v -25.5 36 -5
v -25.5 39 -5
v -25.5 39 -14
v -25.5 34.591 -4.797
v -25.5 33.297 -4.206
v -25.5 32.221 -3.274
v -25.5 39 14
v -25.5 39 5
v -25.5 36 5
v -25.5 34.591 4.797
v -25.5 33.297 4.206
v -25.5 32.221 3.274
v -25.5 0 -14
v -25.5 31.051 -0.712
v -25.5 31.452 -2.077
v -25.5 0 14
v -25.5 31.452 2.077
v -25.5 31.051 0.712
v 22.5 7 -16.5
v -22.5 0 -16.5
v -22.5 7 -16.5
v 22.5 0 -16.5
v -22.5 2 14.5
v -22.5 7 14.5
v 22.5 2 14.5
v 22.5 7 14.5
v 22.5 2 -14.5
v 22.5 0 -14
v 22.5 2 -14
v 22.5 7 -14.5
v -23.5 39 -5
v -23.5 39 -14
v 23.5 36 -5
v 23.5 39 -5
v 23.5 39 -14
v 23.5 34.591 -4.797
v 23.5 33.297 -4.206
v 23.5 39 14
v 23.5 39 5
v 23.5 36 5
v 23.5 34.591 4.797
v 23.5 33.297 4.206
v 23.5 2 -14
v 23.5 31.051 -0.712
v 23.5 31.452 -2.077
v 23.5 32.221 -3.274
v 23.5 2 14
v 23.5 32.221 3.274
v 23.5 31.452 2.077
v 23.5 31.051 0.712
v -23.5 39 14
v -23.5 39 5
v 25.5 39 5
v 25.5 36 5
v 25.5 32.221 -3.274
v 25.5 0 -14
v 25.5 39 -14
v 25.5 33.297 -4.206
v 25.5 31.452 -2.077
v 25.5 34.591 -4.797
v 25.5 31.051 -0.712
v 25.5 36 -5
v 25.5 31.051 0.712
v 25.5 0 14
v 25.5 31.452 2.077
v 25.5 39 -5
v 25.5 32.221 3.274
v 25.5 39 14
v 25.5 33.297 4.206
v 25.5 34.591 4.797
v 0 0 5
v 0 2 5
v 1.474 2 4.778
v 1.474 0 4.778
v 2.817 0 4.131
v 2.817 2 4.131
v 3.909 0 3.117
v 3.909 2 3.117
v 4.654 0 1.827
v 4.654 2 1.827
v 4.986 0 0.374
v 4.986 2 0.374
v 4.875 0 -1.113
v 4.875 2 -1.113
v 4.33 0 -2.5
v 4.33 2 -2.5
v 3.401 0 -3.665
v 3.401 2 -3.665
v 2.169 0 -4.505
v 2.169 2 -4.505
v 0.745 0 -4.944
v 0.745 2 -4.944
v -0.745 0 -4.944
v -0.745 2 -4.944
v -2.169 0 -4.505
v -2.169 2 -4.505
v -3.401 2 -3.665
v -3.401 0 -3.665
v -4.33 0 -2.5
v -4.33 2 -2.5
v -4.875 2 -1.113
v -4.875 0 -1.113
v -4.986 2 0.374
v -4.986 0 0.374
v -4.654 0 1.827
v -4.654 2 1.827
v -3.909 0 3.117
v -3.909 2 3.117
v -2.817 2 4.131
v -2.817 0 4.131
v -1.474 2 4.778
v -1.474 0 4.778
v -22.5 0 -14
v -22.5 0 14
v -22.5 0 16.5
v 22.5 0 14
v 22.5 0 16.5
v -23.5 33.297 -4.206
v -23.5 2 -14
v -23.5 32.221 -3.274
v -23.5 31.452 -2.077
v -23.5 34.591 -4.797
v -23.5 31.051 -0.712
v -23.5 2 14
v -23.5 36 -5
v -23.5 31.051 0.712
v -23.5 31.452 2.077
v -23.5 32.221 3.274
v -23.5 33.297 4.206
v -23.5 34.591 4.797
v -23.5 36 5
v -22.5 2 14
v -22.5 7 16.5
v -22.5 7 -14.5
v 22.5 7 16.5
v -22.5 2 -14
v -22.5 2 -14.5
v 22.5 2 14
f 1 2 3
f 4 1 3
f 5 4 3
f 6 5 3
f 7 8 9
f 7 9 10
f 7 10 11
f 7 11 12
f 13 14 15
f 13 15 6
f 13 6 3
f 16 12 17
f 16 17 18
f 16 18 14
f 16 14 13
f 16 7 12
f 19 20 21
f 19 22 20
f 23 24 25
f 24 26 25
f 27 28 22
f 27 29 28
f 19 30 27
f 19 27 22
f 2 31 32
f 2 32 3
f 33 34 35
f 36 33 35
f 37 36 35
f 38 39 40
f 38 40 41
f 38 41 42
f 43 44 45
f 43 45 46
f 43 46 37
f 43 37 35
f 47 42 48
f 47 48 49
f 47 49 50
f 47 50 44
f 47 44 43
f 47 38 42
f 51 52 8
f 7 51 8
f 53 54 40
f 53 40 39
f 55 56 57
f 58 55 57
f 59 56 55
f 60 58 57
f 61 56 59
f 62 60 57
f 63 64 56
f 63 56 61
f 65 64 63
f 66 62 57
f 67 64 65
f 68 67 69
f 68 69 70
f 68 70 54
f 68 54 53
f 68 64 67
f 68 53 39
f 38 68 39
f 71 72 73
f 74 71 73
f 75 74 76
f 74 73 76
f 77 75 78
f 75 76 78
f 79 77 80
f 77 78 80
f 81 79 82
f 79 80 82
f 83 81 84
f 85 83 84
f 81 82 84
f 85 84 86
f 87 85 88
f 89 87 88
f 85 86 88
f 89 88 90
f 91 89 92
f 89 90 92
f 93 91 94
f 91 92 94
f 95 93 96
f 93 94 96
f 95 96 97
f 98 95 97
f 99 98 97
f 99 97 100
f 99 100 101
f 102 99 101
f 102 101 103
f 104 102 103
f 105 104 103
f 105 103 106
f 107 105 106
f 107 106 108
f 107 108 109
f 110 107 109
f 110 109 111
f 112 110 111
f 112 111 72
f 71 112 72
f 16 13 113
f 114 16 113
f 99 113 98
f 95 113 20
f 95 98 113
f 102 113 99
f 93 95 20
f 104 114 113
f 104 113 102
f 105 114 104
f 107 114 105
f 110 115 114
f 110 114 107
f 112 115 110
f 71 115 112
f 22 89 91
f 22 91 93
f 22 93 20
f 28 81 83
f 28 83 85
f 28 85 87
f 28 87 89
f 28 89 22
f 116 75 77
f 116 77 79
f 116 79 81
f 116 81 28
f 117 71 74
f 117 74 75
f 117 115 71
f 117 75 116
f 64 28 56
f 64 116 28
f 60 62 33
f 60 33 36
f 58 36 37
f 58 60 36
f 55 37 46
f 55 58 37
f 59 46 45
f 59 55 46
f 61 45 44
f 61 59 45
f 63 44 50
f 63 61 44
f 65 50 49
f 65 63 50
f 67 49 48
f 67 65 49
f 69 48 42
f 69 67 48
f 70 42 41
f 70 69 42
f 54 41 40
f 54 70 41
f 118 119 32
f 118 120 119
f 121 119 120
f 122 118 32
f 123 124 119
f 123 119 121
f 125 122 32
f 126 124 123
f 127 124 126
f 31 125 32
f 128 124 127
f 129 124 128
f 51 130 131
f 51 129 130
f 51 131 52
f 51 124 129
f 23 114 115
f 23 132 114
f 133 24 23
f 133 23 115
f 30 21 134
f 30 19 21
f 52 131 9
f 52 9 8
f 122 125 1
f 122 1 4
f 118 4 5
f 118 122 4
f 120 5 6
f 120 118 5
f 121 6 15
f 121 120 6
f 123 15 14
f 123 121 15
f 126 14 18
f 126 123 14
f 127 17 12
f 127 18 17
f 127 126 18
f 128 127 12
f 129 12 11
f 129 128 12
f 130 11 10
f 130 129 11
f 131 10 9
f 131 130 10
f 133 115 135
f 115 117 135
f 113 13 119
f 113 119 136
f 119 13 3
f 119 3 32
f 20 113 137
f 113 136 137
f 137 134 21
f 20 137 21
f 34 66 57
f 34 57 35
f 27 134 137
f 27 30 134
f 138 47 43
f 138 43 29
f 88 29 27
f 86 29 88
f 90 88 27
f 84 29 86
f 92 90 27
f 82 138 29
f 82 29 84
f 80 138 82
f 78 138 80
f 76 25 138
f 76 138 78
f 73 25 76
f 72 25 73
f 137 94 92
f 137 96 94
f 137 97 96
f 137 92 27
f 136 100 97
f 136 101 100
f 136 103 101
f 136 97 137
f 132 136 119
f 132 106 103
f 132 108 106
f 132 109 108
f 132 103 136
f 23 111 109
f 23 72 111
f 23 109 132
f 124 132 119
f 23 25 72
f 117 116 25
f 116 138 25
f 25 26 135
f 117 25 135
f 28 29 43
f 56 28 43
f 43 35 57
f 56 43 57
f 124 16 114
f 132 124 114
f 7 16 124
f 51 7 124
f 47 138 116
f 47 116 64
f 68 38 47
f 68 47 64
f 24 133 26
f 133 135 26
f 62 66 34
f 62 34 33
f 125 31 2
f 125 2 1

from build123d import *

# Parameters (mm, degrees)
BOSS_EXTRUDE1_DEPTH = 14
BOSS_EXTRUDE2_DEPTH = 22.5
CUT_EXTRUDE1_DEPTH  = 67.289139382
SKETCH4_R           = 5
CUT_EXTRUDE2_DEPTH  = 48.86961458


with BuildPart() as part:
    # Sketch1 → Boss-Extrude1 (new, symmetric)
    with BuildSketch(Plane.XY):
        Polygon((-25.5, 39), (-25.5, 0), (25.5, 0), (25.5, 39), (23.5, 39), (23.5, 2), (-23.5, 2), (-23.5, 39), align=None)
    extrude(amount=BOSS_EXTRUDE1_DEPTH, both=True)

    # Sketch2 → Boss-Extrude2 (add, symmetric)
    with BuildSketch(Plane(origin=(0, 0, 0), x_dir=(0, 0, -1), z_dir=(1, 0, 0))):
        Polygon((-14, 0), (-16.5, 0), (-16.5, 7), (-14.5, 7), (-14.5, 2), (-14, 2), align=None)
    boss_extrude2 = extrude(amount=BOSS_EXTRUDE2_DEPTH, both=True)

    # Mirror1: Boss-Extrude2 across plane
    add(boss_extrude2.mirror(Plane.XY))

    # Sketch3 → Cut-Extrude1 (cut, through all)
    with BuildSketch(Plane(origin=(25.5, 0, 0), x_dir=(0, 0, -1), z_dir=(1, 0, 0))):
        with BuildLine():
            Line((-5, 36), (-5, 39))
            Line((-5, 39), (5, 39))
            Line((5, 39), (5, 36))
            ThreePointArc((5, 36), (0, 31), (-5, 36))
        make_face()
    extrude(amount=-CUT_EXTRUDE1_DEPTH, mode=Mode.SUBTRACT)

    # Sketch4 → Cut-Extrude2 (cut, through all)
    with BuildSketch(Plane(origin=(0, 2, 0), x_dir=(1, 0, 0), z_dir=(0, 1, 0))):
        with Locations(Location((0, 0, 0), (0, 0, 270))):
            Circle(SKETCH4_R)
    extrude(amount=-CUT_EXTRUDE2_DEPTH, mode=Mode.SUBTRACT)


solid = part.part
